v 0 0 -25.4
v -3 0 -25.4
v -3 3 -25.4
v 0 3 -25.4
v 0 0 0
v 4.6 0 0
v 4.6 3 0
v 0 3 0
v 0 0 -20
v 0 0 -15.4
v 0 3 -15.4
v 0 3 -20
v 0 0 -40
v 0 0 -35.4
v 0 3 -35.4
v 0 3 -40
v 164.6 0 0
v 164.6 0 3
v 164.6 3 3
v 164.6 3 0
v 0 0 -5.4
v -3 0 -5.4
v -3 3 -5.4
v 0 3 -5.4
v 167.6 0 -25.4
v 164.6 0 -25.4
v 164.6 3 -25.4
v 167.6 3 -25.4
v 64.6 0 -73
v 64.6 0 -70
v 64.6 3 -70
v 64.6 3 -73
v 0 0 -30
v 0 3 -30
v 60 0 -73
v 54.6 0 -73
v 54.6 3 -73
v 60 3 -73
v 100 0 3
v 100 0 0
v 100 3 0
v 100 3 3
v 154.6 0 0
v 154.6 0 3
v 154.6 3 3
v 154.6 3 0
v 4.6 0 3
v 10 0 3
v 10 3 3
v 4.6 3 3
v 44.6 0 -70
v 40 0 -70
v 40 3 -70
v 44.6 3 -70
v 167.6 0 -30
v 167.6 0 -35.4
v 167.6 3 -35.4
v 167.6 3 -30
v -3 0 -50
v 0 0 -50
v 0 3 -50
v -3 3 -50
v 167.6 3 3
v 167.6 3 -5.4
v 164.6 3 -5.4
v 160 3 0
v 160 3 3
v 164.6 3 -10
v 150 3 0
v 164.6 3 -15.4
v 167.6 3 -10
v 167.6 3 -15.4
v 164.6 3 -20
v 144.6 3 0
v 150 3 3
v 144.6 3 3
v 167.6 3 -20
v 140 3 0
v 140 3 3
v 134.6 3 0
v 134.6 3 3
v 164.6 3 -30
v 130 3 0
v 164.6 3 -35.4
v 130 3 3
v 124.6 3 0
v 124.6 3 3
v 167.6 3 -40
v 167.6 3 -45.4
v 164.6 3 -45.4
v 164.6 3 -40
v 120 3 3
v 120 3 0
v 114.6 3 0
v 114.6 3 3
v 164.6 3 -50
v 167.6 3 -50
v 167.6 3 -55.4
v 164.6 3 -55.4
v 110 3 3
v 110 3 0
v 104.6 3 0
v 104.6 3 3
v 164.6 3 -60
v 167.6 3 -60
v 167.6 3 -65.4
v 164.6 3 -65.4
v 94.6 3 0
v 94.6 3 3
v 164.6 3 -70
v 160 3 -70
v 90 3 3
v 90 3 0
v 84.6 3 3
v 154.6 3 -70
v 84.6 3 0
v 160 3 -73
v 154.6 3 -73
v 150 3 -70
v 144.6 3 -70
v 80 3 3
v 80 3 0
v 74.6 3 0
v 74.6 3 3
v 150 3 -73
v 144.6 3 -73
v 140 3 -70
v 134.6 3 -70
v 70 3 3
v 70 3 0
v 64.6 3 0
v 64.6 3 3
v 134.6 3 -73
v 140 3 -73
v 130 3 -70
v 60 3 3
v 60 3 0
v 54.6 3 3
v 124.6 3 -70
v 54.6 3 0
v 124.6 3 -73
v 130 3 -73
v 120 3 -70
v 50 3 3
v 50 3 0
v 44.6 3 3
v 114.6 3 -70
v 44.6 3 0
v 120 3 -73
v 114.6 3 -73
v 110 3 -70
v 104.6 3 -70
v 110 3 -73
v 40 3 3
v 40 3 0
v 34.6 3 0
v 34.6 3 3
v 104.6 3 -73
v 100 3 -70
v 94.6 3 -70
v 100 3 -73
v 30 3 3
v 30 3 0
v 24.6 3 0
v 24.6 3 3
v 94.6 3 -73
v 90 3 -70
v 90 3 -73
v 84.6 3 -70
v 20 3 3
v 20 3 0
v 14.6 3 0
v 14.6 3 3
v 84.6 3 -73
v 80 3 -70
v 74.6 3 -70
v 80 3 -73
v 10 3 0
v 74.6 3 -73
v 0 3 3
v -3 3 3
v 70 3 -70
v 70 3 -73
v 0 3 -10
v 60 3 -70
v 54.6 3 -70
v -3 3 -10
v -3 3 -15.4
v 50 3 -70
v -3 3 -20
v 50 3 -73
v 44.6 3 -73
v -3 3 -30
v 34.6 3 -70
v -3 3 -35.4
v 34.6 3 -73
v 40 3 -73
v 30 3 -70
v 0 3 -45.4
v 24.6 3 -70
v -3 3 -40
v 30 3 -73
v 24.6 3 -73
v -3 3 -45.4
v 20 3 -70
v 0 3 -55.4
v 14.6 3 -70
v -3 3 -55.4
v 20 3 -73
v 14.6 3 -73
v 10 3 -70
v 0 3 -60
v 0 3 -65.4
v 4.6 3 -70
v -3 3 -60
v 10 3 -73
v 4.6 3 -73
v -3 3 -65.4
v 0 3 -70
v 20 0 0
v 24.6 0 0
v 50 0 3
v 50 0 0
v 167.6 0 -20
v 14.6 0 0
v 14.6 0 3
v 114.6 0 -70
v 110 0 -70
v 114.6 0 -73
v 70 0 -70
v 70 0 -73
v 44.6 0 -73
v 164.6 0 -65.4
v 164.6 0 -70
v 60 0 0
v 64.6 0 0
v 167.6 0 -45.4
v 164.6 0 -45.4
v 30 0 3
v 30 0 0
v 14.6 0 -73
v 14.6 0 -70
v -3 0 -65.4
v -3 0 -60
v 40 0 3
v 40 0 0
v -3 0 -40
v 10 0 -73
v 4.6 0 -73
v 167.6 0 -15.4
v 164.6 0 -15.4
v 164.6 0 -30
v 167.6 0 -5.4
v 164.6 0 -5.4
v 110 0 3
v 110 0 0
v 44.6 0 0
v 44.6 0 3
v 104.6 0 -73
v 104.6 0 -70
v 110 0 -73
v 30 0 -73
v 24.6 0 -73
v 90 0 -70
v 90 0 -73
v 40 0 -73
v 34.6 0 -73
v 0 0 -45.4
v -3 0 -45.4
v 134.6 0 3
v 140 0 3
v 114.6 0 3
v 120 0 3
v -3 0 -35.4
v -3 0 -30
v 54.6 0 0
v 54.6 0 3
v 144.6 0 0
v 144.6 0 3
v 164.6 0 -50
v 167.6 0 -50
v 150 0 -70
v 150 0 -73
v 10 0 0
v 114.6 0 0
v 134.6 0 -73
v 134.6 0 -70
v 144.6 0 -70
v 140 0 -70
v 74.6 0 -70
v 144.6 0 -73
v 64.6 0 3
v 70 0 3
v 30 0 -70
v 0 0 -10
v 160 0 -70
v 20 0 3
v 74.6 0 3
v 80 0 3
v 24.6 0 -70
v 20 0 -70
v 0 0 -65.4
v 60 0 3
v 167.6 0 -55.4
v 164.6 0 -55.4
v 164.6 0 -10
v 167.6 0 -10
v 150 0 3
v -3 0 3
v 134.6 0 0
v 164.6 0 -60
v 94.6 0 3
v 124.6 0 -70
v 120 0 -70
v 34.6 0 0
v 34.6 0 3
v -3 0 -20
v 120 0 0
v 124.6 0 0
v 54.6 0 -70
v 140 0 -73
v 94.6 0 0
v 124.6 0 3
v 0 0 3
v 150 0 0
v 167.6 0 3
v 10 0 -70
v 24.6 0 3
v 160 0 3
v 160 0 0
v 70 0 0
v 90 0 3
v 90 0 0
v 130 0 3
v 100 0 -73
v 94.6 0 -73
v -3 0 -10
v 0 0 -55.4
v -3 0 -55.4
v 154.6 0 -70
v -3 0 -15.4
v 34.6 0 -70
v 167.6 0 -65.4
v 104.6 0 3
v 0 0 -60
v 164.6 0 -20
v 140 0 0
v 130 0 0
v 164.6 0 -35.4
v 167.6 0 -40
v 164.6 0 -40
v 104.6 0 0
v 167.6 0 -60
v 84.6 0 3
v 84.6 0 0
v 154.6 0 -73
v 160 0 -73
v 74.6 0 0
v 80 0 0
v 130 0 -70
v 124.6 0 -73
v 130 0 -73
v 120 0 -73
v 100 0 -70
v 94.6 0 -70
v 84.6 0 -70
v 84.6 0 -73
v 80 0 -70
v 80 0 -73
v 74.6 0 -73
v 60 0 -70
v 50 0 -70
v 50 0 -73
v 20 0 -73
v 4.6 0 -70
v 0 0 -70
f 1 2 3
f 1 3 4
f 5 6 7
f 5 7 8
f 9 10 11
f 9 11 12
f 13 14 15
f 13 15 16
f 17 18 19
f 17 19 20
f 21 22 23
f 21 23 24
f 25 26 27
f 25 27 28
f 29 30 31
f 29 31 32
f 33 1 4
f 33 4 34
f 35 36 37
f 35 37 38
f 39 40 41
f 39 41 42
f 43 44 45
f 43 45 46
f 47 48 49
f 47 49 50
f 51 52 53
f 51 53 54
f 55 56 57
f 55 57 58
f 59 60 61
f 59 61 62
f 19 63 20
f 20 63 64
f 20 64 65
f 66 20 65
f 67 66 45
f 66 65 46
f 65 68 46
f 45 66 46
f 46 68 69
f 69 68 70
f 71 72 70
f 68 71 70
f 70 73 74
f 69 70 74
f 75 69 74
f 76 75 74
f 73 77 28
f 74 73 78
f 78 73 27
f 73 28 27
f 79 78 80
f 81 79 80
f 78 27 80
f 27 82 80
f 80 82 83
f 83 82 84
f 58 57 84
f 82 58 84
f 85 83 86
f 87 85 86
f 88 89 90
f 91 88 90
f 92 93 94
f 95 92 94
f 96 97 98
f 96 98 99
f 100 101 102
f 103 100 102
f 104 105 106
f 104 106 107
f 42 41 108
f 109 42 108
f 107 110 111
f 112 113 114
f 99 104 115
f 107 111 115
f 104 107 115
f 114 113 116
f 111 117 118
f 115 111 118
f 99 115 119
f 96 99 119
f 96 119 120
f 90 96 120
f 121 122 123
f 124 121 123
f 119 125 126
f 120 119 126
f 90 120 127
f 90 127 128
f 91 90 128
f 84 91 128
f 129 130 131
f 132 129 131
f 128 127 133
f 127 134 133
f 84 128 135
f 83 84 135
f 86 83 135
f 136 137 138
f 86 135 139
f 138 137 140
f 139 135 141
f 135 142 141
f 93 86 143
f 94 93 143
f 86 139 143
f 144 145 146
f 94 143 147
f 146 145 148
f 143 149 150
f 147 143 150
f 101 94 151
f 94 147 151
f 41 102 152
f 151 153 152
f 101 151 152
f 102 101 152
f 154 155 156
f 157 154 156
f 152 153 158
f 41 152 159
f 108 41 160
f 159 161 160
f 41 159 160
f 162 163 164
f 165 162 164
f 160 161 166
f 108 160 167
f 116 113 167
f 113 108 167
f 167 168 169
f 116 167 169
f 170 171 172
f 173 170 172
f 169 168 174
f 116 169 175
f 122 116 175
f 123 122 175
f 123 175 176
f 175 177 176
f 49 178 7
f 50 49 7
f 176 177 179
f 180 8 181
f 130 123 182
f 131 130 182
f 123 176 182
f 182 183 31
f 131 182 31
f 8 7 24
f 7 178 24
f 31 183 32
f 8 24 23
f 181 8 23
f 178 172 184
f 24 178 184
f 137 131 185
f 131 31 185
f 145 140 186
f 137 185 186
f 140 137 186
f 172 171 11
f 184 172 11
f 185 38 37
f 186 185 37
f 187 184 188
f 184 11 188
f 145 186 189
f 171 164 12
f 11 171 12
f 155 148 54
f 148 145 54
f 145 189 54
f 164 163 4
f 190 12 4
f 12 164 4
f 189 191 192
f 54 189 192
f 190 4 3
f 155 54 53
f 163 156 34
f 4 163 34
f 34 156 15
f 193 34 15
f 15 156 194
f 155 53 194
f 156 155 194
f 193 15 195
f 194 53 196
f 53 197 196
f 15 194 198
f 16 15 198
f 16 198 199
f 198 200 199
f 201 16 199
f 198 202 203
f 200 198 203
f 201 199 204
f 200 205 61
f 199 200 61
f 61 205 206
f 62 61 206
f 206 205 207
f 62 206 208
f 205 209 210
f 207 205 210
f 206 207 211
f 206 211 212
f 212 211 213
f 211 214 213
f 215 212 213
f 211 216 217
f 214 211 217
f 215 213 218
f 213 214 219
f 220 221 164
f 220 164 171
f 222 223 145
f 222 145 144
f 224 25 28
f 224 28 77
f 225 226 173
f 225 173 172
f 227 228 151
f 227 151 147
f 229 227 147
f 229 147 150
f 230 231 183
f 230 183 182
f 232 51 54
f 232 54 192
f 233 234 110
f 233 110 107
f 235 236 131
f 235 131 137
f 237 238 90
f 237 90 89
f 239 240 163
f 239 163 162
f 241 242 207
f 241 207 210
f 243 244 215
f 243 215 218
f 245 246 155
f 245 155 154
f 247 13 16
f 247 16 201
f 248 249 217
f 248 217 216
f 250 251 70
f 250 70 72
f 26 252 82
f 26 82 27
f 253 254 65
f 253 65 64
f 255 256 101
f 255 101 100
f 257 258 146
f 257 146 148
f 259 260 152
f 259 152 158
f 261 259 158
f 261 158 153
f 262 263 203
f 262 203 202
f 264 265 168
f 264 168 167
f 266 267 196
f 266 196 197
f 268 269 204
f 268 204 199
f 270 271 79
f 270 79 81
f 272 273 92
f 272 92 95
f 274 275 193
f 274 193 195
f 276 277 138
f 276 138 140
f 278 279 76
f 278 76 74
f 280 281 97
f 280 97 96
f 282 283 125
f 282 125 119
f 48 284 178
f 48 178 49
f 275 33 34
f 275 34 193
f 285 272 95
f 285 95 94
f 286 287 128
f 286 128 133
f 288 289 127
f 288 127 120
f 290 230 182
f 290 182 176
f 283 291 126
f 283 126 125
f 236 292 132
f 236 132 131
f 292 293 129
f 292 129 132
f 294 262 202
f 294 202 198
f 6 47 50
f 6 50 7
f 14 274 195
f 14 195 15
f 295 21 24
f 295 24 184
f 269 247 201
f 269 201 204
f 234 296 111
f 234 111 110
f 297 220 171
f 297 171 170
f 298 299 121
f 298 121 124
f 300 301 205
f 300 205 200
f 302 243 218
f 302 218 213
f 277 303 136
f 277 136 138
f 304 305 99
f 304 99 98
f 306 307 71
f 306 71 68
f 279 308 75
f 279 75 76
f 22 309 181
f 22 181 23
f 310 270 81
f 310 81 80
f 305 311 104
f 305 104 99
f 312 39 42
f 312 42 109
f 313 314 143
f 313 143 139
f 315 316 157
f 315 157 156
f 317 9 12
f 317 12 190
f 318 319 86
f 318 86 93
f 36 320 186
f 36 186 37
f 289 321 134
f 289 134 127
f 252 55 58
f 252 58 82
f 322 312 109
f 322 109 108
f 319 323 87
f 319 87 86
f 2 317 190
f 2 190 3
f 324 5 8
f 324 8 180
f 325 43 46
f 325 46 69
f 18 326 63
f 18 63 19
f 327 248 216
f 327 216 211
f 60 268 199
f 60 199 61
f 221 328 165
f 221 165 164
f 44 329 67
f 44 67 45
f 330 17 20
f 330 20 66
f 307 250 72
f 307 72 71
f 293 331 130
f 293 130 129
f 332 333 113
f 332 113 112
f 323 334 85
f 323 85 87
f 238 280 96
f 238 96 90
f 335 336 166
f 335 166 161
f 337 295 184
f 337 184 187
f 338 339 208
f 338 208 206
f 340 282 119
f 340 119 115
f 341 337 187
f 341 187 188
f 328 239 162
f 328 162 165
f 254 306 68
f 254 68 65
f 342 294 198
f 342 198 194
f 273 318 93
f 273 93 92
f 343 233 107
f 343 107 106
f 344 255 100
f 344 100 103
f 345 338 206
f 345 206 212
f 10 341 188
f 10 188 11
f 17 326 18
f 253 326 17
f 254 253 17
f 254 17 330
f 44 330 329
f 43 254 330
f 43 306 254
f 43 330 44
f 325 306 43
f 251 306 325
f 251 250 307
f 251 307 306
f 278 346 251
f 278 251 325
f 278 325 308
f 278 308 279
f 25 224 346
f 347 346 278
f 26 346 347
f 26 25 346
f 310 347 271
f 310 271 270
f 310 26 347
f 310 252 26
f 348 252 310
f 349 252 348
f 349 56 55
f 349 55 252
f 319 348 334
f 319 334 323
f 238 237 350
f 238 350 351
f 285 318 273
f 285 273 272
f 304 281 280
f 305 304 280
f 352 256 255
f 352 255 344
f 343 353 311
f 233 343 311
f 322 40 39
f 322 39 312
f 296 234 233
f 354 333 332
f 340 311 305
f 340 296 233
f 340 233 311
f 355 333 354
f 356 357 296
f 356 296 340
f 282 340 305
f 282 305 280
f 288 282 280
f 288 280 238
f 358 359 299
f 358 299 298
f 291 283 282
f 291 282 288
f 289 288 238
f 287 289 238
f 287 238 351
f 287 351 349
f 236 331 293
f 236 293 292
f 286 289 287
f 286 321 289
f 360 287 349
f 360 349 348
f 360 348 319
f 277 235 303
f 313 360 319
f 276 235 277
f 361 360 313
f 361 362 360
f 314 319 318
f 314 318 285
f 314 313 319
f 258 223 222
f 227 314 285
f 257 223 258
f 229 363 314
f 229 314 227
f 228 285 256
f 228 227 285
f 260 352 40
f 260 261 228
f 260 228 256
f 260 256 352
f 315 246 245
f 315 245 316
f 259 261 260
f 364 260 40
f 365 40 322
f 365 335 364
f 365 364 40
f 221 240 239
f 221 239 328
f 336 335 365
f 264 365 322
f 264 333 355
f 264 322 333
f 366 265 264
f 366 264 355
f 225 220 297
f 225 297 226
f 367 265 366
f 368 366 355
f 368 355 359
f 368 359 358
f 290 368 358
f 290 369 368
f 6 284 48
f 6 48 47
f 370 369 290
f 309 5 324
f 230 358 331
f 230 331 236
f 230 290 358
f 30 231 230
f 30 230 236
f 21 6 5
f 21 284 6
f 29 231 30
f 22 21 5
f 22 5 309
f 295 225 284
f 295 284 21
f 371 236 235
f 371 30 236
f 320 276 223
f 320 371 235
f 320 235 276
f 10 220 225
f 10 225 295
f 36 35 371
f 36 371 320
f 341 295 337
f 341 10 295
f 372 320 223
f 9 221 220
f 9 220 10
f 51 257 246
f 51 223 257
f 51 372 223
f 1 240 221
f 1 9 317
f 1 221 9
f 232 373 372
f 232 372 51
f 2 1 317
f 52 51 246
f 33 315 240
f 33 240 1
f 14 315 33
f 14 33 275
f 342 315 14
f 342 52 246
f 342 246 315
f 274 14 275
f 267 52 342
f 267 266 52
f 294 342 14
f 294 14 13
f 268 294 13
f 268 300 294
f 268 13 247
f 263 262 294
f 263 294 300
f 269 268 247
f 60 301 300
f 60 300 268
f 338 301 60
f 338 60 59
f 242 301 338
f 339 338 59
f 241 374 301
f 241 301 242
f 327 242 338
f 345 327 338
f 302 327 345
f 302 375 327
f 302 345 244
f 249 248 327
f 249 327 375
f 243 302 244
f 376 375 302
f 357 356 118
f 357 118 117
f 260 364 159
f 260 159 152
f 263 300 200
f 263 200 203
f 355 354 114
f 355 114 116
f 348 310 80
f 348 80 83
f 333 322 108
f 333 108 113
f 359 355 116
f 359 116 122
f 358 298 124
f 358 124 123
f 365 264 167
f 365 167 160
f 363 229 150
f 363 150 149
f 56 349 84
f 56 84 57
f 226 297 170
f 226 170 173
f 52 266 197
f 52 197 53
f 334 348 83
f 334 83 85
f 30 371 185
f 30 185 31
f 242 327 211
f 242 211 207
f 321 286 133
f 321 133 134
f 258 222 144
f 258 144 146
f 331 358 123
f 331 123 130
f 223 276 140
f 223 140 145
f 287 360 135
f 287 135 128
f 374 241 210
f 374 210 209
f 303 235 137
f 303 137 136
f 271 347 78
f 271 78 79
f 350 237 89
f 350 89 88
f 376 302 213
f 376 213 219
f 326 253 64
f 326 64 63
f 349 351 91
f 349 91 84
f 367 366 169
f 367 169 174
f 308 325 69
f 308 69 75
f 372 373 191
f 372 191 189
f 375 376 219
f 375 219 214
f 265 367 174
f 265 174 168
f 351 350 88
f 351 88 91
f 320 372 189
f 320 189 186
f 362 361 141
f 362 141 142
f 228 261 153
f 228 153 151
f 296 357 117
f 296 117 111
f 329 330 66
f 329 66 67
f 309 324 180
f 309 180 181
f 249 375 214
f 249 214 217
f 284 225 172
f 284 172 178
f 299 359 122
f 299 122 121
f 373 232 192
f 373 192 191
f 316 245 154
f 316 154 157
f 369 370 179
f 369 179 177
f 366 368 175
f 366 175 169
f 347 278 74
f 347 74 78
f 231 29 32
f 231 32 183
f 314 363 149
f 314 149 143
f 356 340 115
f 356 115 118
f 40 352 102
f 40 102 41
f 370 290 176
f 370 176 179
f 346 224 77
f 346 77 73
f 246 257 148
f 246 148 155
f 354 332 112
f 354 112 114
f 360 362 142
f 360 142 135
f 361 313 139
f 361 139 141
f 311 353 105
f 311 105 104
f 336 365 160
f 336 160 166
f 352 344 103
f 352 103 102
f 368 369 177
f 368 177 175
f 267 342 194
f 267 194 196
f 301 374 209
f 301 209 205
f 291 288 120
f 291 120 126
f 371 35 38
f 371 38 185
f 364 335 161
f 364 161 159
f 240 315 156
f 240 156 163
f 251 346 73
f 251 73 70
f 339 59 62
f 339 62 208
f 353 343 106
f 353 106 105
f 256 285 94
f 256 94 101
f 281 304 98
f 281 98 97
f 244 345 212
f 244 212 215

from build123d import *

# Parameters (mm, degrees)
EXTRUDE_1_DEPTH = 3


with BuildPart() as part:
    # Эскиз1 → Бобышка-Вытянуть1 (new body)
    with BuildSketch(Plane(origin=(0, 0, 0), x_dir=(1, 0, 0), z_dir=(0, 1, 0))):
        Polygon((4.6, 70), (4.6, 73), (10, 73), (10, 70), (14.6, 70), (14.6, 73), (20, 73), (20, 70), (24.6, 70), (24.6, 73), (30, 73), (30, 70), (34.6, 70), (34.6, 73), (40, 73), (40, 70), (44.6, 70), (44.6, 73), (50, 73), (50, 70), (54.6, 70), (54.6, 73), (60, 73), (60, 70), (64.6, 70), (64.6, 73), (70, 73), (70, 70), (74.6, 70), (74.6, 73), (80, 73), (80, 70), (84.6, 70), (84.6, 73), (90, 73), (90, 70), (94.6, 70), (94.6, 73), (100, 73), (100, 70), (104.6, 70), (104.6, 73), (110, 73), (110, 70), (114.6, 70), (114.6, 73), (120, 73), (120, 70), (124.6, 70), (124.6, 73), (130, 73), (130, 70), (134.6, 70), (134.6, 73), (140, 73), (140, 70), (144.6, 70), (144.6, 73), (150, 73), (150, 70), (154.6, 70), (154.6, 73), (160, 73), (160, 70), (164.6, 70), (164.6, 65.4), (167.6, 65.4), (167.6, 60), (164.6, 60), (164.6, 55.4), (167.6, 55.4), (167.6, 50), (164.6, 50), (164.6, 45.4), (167.6, 45.4), (167.6, 40), (164.6, 40), (164.6, 35.4), (167.6, 35.4), (167.6, 30), (164.6, 30), (164.6, 25.4), (167.6, 25.4), (167.6, 20), (164.6, 20), (164.6, 15.4), (167.6, 15.4), (167.6, 10), (164.6, 10), (164.6, 5.4), (167.6, 5.4), (167.6, -3), (164.6, -3), (164.6, 0), (160, 0), (160, -3), (154.6, -3), (154.6, 0), (150, 0), (150, -3), (144.6, -3), (144.6, 0), (140, 0), (140, -3), (134.6, -3), (134.6, 0), (130, 0), (130, -3), (124.6, -3), (124.6, 0), (120, 0), (120, -3), (114.6, -3), (114.6, 0), (110, 0), (110, -3), (104.6, -3), (104.6, 0), (100, 0), (100, -3), (94.6, -3), (94.6, 0), (90, 0), (90, -3), (84.6, -3), (84.6, 0), (80, 0), (80, -3), (74.6, -3), (74.6, 0), (70, 0), (70, -3), (64.6, -3), (64.6, 0), (60, 0), (60, -3), (54.6, -3), (54.6, 0), (50, 0), (50, -3), (44.6, -3), (44.6, 0), (40, 0), (40, -3), (34.6, -3), (34.6, 0), (30, 0), (30, -3), (24.6, -3), (24.6, 0), (20, 0), (20, -3), (14.6, -3), (14.6, 0), (10, 0), (10, -3), (4.6, -3), (4.6, 0), (0, 0), (0, -3), (-3, -3), (-3, 5.4), (0, 5.4), (0, 10), (-3, 10), (-3, 15.4), (0, 15.4), (0, 20), (-3, 20), (-3, 25.4), (0, 25.4), (0, 30), (-3, 30), (-3, 35.4), (0, 35.4), (0, 40), (-3, 40), (-3, 45.4), (0, 45.4), (0, 50), (-3, 50), (-3, 55.4), (0, 55.4), (0, 60), (-3, 60), (-3, 65.4), (0, 65.4), (0, 70), align=None)
    extrude(amount=EXTRUDE_1_DEPTH)


solid = part.part
